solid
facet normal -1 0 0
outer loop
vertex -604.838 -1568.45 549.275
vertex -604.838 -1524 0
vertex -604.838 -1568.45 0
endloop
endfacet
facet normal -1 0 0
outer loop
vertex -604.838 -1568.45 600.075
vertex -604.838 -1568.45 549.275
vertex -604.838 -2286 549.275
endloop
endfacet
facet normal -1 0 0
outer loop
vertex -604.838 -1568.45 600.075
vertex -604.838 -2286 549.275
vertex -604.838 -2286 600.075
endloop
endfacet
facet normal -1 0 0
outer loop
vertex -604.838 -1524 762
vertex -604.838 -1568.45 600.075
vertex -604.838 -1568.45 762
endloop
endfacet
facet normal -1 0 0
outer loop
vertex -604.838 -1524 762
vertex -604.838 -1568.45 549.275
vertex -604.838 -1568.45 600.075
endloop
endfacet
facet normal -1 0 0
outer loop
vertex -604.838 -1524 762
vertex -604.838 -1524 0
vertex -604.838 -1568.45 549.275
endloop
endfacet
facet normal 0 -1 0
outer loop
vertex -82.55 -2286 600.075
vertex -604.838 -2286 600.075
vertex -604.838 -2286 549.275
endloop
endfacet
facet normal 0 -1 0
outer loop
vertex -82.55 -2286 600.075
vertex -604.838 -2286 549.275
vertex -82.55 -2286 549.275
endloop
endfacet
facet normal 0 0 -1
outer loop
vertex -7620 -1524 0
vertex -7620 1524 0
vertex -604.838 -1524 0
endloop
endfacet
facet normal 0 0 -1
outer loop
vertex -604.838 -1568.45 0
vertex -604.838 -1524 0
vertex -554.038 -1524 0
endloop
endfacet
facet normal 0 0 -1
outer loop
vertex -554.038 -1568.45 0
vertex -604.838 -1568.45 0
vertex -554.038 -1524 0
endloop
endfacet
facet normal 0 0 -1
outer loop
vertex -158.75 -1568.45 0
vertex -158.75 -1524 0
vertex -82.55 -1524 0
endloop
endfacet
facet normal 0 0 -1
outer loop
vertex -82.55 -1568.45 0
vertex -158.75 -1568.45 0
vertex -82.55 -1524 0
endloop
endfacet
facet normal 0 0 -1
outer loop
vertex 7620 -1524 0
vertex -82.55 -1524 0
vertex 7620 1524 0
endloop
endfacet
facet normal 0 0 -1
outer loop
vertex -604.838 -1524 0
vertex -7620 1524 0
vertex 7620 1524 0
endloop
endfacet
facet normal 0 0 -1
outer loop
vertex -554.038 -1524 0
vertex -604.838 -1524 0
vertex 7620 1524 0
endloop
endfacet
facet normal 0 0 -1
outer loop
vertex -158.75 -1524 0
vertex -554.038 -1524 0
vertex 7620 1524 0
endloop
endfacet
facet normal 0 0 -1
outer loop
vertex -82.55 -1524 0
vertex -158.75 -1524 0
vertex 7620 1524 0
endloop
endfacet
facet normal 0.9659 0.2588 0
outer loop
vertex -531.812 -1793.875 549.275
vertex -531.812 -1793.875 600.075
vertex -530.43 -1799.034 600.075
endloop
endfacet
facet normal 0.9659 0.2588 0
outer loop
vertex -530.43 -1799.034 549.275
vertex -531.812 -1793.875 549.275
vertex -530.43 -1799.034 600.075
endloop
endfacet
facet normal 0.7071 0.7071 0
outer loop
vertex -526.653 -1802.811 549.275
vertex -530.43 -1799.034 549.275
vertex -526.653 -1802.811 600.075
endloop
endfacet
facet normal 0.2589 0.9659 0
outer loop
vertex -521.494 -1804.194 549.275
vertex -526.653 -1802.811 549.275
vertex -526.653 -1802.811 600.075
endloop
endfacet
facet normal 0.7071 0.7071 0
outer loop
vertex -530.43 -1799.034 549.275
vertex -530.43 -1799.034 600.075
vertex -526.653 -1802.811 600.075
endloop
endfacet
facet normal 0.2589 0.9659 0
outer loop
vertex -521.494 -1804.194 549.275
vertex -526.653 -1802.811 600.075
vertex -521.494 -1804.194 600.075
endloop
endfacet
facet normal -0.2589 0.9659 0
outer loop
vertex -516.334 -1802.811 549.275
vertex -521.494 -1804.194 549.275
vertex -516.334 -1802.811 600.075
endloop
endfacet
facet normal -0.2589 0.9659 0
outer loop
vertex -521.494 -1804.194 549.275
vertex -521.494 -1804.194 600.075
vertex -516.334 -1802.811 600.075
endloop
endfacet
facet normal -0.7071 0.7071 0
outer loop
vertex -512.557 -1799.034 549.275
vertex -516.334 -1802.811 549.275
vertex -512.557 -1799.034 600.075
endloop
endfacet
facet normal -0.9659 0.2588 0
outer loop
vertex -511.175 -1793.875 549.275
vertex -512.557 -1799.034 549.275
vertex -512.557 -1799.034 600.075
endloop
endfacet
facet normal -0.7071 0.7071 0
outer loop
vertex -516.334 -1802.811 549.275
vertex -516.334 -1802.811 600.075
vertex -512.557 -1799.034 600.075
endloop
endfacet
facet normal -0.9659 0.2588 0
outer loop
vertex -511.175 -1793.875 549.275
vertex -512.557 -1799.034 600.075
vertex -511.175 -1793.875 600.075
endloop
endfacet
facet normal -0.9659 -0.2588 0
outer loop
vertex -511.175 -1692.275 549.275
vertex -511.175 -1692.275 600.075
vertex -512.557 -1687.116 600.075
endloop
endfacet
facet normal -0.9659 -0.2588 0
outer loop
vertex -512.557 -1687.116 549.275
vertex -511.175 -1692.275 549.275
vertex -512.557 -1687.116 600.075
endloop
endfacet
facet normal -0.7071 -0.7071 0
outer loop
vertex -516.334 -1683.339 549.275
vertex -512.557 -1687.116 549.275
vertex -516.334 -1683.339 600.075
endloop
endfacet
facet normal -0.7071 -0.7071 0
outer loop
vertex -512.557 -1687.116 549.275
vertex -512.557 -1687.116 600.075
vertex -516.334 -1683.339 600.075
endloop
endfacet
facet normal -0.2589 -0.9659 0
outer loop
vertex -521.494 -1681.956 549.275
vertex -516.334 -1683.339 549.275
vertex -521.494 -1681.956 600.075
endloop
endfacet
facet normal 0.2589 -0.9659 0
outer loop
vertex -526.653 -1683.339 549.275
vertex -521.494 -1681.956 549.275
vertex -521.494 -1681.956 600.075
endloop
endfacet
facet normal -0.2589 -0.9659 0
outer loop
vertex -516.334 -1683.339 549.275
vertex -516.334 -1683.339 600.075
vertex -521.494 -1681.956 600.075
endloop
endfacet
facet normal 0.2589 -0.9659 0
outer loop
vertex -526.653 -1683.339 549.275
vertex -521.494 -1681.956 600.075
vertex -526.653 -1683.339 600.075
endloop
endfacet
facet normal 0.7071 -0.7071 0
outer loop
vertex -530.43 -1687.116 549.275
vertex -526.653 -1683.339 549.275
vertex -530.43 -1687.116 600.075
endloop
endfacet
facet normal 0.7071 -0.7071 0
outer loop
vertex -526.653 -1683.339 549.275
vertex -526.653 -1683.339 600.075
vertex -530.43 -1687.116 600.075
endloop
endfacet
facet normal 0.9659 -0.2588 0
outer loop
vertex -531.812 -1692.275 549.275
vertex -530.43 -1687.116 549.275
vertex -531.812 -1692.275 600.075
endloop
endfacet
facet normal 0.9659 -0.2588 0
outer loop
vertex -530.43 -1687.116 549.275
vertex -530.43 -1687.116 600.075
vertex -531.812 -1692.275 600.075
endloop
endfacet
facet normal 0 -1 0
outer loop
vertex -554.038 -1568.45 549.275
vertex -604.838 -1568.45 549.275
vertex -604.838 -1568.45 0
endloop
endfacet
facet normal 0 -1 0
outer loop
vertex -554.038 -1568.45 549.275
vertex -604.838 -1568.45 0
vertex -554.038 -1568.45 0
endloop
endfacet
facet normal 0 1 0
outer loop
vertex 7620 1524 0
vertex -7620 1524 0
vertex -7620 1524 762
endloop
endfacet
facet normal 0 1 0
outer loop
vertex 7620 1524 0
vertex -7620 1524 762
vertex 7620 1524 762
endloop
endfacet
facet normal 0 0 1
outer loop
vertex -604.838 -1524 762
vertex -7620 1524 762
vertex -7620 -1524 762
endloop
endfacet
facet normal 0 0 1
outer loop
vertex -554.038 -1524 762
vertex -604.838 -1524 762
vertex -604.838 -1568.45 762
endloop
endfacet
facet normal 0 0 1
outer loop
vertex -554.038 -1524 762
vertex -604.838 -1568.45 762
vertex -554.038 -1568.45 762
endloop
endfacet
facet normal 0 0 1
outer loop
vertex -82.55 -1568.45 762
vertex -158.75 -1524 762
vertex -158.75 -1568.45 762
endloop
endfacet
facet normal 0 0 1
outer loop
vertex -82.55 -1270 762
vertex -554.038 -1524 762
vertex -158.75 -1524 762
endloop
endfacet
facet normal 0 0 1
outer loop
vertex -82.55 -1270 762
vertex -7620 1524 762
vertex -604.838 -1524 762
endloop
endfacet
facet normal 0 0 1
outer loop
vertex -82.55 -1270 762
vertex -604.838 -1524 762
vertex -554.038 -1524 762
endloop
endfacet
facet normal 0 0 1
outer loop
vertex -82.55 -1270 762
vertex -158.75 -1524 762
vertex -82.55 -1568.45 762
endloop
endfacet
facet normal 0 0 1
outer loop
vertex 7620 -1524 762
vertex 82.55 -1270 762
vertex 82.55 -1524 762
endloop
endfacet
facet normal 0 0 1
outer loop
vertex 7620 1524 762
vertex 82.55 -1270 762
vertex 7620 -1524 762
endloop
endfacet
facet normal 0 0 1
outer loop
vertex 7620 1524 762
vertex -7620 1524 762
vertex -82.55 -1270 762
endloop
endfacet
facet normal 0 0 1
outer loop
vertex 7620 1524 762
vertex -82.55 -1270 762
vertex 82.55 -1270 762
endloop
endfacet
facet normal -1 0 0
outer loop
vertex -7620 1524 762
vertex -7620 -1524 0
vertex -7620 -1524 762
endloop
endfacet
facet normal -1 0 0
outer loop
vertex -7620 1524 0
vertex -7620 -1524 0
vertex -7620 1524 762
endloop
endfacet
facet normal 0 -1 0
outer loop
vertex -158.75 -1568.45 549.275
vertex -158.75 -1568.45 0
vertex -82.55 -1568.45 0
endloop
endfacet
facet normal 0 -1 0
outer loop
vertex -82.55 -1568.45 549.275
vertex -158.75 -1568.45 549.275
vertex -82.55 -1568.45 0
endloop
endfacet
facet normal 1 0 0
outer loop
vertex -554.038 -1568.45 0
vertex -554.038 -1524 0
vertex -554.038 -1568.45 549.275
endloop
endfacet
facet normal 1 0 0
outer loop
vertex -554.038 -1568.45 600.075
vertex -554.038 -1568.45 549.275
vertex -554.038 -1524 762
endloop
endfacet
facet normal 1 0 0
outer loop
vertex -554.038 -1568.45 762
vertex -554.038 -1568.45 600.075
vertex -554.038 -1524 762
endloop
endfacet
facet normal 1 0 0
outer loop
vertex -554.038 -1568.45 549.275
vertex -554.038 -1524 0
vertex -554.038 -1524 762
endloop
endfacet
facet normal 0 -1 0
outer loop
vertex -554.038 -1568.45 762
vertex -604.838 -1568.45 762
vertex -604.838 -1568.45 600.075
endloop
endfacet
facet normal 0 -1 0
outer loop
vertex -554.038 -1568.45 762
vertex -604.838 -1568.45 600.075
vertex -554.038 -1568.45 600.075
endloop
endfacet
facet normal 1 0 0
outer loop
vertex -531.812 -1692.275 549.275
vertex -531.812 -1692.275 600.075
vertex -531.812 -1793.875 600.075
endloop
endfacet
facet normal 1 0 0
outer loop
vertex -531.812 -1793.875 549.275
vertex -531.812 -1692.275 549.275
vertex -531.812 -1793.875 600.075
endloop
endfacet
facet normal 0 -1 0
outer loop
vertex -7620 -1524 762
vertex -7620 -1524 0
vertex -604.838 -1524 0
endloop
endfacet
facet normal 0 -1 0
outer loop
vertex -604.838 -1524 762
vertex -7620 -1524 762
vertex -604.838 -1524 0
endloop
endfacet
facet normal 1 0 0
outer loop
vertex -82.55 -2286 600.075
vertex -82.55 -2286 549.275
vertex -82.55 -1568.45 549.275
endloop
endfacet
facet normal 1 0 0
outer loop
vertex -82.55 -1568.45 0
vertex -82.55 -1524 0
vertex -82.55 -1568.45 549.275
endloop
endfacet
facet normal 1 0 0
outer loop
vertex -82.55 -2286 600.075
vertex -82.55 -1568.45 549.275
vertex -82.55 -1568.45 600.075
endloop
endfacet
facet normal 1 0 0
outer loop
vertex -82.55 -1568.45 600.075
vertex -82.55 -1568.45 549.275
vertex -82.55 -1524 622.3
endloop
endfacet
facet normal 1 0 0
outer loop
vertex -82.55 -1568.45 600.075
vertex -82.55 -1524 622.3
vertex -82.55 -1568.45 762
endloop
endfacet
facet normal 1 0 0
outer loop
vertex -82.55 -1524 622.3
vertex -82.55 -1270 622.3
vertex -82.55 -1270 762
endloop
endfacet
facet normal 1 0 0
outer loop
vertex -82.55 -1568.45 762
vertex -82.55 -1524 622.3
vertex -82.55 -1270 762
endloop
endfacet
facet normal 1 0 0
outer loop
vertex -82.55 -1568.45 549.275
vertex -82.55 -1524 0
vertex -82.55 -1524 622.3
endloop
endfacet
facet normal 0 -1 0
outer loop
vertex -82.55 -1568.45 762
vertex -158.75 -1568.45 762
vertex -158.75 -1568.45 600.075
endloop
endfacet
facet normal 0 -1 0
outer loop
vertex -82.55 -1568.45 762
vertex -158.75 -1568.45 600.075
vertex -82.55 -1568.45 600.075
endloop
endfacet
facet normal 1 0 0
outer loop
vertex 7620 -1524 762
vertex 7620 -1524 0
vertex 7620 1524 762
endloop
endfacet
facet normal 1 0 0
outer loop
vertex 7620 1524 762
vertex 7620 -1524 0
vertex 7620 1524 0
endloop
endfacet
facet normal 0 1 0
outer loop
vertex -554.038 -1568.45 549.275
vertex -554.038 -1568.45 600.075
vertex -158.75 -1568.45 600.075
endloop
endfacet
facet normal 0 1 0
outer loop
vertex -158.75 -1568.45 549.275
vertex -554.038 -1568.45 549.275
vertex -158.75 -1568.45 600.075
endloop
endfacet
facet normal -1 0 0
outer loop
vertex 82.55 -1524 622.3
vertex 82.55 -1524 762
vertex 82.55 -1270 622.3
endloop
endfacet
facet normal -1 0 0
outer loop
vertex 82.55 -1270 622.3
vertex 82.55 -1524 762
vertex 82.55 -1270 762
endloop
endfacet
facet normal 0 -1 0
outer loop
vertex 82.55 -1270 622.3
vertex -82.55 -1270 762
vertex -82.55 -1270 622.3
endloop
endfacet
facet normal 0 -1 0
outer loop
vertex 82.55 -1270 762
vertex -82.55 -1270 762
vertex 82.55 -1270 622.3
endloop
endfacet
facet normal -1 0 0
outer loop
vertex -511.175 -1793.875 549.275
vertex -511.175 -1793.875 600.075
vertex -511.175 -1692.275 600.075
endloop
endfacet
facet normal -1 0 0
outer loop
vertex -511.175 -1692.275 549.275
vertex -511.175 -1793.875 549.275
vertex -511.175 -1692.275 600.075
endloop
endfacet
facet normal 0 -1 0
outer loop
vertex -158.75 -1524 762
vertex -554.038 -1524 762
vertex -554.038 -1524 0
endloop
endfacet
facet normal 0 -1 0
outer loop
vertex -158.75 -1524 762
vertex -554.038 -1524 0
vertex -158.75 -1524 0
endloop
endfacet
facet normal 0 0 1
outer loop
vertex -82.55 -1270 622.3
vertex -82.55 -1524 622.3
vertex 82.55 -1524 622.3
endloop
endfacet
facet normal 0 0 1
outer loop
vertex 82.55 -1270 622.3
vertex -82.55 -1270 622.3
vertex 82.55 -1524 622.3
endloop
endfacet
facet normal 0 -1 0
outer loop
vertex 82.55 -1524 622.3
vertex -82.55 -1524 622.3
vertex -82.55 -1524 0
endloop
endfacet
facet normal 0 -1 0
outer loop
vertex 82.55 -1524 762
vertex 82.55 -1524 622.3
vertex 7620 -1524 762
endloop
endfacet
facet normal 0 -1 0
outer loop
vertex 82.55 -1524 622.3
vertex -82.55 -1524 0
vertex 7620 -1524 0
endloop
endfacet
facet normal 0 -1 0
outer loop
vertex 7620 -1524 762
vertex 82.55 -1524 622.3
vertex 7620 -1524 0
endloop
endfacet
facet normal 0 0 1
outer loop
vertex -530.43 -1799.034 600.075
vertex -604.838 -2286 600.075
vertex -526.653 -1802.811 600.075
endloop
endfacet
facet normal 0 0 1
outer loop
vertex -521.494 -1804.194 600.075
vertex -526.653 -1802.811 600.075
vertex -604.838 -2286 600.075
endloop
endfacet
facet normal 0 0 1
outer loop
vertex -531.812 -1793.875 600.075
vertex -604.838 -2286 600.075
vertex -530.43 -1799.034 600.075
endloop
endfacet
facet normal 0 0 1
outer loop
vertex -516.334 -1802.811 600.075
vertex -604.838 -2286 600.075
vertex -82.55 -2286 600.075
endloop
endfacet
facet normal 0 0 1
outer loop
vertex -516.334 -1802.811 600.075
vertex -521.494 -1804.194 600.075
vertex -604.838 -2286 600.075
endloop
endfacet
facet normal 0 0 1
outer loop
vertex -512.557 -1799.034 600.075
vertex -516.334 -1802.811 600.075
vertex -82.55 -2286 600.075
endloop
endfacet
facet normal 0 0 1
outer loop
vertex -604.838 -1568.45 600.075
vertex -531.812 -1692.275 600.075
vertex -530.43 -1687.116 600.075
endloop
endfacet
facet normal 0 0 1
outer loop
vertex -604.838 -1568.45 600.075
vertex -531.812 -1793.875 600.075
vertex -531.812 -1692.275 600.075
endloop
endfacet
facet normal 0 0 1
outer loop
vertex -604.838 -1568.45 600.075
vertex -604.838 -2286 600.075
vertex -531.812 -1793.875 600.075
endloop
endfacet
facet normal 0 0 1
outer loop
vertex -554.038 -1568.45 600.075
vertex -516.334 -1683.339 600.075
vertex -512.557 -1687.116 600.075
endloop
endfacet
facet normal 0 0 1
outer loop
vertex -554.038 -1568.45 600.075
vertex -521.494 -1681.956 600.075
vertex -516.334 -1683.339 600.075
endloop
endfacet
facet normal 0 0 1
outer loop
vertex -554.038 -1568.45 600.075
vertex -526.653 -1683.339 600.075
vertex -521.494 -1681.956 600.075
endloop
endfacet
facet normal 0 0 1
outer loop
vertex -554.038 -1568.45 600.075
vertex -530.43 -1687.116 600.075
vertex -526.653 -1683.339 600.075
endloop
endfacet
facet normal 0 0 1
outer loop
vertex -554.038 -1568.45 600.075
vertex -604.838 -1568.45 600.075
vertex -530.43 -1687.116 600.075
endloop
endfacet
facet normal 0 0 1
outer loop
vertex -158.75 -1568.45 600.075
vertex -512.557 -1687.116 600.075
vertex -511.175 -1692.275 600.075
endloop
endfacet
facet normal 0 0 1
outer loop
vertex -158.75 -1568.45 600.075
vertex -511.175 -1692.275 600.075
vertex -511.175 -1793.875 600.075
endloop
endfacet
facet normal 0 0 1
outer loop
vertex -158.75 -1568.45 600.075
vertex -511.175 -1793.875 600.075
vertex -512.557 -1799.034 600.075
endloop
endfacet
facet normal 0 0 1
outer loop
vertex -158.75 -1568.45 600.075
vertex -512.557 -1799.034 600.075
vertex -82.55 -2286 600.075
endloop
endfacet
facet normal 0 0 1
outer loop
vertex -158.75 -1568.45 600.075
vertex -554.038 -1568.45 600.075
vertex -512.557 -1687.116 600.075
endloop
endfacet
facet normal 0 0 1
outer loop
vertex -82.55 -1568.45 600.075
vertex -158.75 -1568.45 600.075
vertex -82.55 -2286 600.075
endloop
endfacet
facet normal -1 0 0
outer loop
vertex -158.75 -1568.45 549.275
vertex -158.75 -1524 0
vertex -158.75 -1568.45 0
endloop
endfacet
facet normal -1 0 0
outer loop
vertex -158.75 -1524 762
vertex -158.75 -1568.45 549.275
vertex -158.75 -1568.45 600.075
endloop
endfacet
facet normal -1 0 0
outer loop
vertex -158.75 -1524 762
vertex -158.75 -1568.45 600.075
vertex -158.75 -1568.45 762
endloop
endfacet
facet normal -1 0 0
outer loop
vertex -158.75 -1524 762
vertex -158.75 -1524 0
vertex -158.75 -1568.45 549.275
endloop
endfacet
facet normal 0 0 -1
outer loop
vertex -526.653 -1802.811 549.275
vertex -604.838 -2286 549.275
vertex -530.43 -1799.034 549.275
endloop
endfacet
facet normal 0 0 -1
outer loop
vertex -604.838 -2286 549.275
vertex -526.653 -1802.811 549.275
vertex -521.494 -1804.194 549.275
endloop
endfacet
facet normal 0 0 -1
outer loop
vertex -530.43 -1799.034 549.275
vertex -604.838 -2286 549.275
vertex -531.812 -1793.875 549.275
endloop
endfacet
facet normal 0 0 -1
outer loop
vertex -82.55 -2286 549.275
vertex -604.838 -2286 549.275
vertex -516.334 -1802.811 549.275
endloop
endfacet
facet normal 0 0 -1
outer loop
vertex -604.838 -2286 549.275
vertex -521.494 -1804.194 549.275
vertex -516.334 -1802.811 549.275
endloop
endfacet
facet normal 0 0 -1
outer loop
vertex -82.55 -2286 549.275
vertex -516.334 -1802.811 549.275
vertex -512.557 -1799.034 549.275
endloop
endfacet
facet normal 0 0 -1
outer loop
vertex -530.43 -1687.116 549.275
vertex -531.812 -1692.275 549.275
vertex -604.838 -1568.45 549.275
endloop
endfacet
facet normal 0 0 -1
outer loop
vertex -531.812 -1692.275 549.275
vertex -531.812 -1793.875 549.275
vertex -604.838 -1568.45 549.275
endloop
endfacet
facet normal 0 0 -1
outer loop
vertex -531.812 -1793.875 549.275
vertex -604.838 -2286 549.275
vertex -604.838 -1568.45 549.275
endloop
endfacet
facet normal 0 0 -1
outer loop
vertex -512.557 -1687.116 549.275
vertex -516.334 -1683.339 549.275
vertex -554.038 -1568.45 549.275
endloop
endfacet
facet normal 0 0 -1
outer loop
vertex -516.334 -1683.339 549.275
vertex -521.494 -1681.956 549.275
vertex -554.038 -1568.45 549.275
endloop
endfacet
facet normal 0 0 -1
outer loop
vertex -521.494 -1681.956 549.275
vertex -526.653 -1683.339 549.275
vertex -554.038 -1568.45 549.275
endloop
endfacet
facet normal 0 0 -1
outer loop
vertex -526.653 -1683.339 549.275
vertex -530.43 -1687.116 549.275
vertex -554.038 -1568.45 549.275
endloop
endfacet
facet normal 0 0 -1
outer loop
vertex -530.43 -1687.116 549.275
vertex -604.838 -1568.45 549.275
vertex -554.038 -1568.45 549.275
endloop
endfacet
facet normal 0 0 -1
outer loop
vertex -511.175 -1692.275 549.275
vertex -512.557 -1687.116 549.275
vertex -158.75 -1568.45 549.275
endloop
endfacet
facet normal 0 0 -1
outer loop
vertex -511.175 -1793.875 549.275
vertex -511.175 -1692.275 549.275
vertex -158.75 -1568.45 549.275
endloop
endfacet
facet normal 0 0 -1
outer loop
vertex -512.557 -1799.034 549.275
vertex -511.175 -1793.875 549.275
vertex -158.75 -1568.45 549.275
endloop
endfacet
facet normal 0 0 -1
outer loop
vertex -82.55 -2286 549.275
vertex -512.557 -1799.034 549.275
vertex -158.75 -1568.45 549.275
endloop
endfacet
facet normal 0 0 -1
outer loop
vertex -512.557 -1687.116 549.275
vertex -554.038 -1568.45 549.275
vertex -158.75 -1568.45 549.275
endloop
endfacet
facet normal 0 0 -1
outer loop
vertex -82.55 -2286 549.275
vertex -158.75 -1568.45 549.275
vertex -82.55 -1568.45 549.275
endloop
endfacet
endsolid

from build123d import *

# Parameters (mm, degrees)
F0_W      = 15240
F0_H      = 3048
F1_DEPTH  = 762
F2_W      = 165.1
F2_H      = 254
F3_DEPTH  = 139.7
F4_W      = 76.2
F4_H      = 762
F5_DEPTH  = 44.45
F6_W      = 522.2875
F6_H      = 50.8
F7_DEPTH  = 717.55
F8_W      = 50.8
F8_H      = 762
F9_DEPTH  = 44.45
F11_DEPTH = 50.8


with BuildPart() as f1:
    # F0 (on Top) → F1 (new body)
    with BuildSketch(Plane.XY):
        Rectangle(F0_W, F0_H)
    extrude(amount=F1_DEPTH)

    # F2 (on face) → F3 (cut)
    with BuildSketch(Plane.XY.offset(762)):
        with Locations((0, -1397)):
            Rectangle(F2_W, F2_H)
    extrude(amount=-F3_DEPTH, mode=Mode.SUBTRACT)

    # F4 (on face) → F5 (join)
    with BuildSketch(Plane.XZ.offset(1524)):
        with Locations((-120.65, 381)):
            Rectangle(F4_W, F4_H)
    extrude(amount=F5_DEPTH)

    # F6 (on face) → F7 (join)
    with BuildSketch(Plane.XZ.offset(1568.45)):
        with Locations((-343.69375, 574.675)):
            Rectangle(F6_W, F6_H)
    extrude(amount=F7_DEPTH)

    # F8 (on face) → F9 (join)
    with BuildSketch(Plane.XZ.offset(1524)):
        with Locations((-579.4375, 381)):
            Rectangle(F8_W, F8_H)
    extrude(amount=F9_DEPTH)

    # F10 (on face) → F11 (cut, through all)
    with BuildSketch(Plane.XY.offset(600.075)):
        with BuildLine():
            ThreePointArc((-511.175, -1692.275), (-521.49375, -1681.95625), (-531.8125, -1692.275))
            Line((-531.8125, -1692.275), (-531.8125, -1793.875))
            ThreePointArc((-531.8125, -1793.875), (-521.49375, -1804.19375), (-511.175, -1793.875))
            Line((-511.175, -1793.875), (-511.175, -1692.275))
        make_face()
    extrude(amount=-F11_DEPTH, mode=Mode.SUBTRACT)


solid = f1.part
